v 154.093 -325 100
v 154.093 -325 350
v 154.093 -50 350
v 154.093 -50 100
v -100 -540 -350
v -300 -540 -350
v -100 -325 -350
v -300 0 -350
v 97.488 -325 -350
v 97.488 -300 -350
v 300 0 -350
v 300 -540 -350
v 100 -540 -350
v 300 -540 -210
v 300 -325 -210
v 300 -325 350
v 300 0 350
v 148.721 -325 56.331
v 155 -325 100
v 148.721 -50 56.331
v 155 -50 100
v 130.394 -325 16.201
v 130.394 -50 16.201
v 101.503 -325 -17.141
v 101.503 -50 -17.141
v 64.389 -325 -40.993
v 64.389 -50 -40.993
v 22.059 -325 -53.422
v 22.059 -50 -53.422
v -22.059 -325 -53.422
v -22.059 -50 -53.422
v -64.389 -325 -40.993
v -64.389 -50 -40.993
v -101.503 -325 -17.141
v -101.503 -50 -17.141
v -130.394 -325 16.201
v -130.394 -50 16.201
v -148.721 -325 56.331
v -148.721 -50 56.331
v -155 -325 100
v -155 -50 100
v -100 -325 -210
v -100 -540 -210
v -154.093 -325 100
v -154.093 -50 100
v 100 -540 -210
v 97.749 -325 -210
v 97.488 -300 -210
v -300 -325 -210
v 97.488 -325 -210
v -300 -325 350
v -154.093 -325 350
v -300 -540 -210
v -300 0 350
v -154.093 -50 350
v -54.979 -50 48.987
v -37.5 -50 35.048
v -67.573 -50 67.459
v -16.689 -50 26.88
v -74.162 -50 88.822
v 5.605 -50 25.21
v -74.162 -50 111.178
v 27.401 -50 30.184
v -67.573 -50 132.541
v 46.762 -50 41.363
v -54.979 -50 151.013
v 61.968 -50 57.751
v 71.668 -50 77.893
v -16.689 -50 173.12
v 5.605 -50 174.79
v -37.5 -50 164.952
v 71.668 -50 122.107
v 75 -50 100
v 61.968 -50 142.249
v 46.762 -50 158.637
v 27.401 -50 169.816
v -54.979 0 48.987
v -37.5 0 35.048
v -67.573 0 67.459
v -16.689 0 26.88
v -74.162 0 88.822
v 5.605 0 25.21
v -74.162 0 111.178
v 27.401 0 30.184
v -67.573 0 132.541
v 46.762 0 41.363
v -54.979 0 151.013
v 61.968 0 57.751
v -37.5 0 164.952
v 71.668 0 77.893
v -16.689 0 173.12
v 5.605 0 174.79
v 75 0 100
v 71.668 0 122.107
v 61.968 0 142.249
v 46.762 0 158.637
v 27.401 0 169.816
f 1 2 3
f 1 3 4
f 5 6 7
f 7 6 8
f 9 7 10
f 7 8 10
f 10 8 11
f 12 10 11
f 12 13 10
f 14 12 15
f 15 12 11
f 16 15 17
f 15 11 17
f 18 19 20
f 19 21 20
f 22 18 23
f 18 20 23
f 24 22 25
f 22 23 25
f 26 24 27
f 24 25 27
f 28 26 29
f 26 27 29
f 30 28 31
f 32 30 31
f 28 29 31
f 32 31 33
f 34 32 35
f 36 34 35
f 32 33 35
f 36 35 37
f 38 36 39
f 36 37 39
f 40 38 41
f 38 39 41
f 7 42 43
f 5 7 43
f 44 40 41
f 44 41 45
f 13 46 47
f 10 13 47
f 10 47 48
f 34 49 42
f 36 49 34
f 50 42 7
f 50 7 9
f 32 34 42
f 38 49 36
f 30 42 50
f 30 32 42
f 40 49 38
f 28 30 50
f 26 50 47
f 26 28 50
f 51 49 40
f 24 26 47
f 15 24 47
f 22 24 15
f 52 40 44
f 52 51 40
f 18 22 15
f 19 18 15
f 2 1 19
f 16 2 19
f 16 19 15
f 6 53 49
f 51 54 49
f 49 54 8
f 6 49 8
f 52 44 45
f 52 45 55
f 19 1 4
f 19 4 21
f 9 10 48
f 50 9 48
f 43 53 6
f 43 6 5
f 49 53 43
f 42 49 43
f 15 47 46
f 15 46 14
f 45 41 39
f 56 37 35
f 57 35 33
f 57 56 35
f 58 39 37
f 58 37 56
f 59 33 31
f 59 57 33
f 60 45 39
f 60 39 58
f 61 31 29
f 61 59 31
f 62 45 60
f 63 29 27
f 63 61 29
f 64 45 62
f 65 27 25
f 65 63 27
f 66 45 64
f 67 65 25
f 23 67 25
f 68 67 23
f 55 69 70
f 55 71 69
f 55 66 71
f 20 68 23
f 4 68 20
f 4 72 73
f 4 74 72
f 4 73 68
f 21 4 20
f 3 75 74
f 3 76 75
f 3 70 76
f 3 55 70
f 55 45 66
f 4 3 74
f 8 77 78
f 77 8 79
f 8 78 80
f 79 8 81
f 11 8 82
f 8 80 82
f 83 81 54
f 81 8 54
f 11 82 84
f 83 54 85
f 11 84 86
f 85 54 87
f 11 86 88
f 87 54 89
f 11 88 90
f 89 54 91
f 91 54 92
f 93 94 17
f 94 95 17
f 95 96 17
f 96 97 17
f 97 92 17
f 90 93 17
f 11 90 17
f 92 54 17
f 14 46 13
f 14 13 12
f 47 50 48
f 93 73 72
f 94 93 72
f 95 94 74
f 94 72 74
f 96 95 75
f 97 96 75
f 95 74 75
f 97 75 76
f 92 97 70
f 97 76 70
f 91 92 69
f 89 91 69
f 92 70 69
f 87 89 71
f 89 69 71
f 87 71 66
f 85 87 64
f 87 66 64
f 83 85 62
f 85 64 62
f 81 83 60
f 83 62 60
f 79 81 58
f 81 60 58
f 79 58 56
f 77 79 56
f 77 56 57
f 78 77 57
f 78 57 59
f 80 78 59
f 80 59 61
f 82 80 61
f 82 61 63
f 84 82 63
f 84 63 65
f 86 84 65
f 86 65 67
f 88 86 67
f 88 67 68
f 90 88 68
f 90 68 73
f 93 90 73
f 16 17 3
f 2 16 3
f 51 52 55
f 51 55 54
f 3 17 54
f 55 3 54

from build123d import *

# Parameters (mm, degrees)
F0_W      = 600
F0_H      = 700
F1_DEPTH  = 540
F2_W      = 600
F2_H      = 560
F3_DEPTH  = 240
F5_DEPTH  = 140.001
F7_DEPTH  = 25
F8_DEPTH  = 250
F9_R      = 75
F10_DEPTH = 50.001


with BuildPart() as f1:
    # F0 (on Front) → F1 (new body)
    with BuildSketch(Plane.XZ):
        Rectangle(F0_W, F0_H)
    extrude(amount=F1_DEPTH)

    # F2 (on face) → F3 (cut)
    with BuildSketch(Plane.XZ.offset(540)):
        with Locations((0, 70)):
            Rectangle(F2_W, F2_H)
    extrude(amount=-F3_DEPTH, mode=Mode.SUBTRACT)

    # F4 (on face) → F5 (cut, through all)
    with BuildSketch(Plane.XY.offset(-210)):
        Polygon((97.4877998233, -300), (-100, -300), (-100, -540), (100, -540), align=None)
    extrude(amount=-F5_DEPTH, mode=Mode.SUBTRACT)

    # F6 (on face) → F7 (join)
    with BuildSketch(Plane.XZ.offset(300)):
        with BuildLine():
            Line((154.0926195456, 100), (155, 100))
            ThreePointArc((155, 100), (0, -55), (-155, 100))
            Line((-155, 100), (-154.0926195456, 100))
            Line((-154.0926195456, 100), (-154.0926195456, 350))
            Line((-154.0926195456, 350), (-300, 350))
            Line((-300, 350), (-300, -210))
            Line((-300, -210), (-100, -210))
            Line((-100, -210), (-100, -350))
            Line((-100, -350), (97.4877998233, -350))
            Line((97.4877998233, -350), (97.4877998233, -210))
            Line((97.4877998233, -210), (300, -210))
            Line((300, -210), (300, 350))
            Line((300, 350), (154.0926195456, 350))
            Line((154.0926195456, 350), (154.0926195456, 100))
        make_face()
    extrude(amount=F7_DEPTH)

    # F8 (cut): faces of the model
    f8_faces = [f1.faces().sort_by_distance(p)[0] for p in [
        (0, -300, 162.2749017605),
        (0, -300, 162.2749017605),
    ]]
    extrude(f8_faces, amount=-F8_DEPTH, mode=Mode.SUBTRACT)

    # F9 (on face) → F10 (cut, through all)
    with BuildSketch(Plane.XZ.offset(50)):
        with Locations((0, 100)):
            Circle(F9_R)
    extrude(amount=-F10_DEPTH, mode=Mode.SUBTRACT)


solid = f1.part
